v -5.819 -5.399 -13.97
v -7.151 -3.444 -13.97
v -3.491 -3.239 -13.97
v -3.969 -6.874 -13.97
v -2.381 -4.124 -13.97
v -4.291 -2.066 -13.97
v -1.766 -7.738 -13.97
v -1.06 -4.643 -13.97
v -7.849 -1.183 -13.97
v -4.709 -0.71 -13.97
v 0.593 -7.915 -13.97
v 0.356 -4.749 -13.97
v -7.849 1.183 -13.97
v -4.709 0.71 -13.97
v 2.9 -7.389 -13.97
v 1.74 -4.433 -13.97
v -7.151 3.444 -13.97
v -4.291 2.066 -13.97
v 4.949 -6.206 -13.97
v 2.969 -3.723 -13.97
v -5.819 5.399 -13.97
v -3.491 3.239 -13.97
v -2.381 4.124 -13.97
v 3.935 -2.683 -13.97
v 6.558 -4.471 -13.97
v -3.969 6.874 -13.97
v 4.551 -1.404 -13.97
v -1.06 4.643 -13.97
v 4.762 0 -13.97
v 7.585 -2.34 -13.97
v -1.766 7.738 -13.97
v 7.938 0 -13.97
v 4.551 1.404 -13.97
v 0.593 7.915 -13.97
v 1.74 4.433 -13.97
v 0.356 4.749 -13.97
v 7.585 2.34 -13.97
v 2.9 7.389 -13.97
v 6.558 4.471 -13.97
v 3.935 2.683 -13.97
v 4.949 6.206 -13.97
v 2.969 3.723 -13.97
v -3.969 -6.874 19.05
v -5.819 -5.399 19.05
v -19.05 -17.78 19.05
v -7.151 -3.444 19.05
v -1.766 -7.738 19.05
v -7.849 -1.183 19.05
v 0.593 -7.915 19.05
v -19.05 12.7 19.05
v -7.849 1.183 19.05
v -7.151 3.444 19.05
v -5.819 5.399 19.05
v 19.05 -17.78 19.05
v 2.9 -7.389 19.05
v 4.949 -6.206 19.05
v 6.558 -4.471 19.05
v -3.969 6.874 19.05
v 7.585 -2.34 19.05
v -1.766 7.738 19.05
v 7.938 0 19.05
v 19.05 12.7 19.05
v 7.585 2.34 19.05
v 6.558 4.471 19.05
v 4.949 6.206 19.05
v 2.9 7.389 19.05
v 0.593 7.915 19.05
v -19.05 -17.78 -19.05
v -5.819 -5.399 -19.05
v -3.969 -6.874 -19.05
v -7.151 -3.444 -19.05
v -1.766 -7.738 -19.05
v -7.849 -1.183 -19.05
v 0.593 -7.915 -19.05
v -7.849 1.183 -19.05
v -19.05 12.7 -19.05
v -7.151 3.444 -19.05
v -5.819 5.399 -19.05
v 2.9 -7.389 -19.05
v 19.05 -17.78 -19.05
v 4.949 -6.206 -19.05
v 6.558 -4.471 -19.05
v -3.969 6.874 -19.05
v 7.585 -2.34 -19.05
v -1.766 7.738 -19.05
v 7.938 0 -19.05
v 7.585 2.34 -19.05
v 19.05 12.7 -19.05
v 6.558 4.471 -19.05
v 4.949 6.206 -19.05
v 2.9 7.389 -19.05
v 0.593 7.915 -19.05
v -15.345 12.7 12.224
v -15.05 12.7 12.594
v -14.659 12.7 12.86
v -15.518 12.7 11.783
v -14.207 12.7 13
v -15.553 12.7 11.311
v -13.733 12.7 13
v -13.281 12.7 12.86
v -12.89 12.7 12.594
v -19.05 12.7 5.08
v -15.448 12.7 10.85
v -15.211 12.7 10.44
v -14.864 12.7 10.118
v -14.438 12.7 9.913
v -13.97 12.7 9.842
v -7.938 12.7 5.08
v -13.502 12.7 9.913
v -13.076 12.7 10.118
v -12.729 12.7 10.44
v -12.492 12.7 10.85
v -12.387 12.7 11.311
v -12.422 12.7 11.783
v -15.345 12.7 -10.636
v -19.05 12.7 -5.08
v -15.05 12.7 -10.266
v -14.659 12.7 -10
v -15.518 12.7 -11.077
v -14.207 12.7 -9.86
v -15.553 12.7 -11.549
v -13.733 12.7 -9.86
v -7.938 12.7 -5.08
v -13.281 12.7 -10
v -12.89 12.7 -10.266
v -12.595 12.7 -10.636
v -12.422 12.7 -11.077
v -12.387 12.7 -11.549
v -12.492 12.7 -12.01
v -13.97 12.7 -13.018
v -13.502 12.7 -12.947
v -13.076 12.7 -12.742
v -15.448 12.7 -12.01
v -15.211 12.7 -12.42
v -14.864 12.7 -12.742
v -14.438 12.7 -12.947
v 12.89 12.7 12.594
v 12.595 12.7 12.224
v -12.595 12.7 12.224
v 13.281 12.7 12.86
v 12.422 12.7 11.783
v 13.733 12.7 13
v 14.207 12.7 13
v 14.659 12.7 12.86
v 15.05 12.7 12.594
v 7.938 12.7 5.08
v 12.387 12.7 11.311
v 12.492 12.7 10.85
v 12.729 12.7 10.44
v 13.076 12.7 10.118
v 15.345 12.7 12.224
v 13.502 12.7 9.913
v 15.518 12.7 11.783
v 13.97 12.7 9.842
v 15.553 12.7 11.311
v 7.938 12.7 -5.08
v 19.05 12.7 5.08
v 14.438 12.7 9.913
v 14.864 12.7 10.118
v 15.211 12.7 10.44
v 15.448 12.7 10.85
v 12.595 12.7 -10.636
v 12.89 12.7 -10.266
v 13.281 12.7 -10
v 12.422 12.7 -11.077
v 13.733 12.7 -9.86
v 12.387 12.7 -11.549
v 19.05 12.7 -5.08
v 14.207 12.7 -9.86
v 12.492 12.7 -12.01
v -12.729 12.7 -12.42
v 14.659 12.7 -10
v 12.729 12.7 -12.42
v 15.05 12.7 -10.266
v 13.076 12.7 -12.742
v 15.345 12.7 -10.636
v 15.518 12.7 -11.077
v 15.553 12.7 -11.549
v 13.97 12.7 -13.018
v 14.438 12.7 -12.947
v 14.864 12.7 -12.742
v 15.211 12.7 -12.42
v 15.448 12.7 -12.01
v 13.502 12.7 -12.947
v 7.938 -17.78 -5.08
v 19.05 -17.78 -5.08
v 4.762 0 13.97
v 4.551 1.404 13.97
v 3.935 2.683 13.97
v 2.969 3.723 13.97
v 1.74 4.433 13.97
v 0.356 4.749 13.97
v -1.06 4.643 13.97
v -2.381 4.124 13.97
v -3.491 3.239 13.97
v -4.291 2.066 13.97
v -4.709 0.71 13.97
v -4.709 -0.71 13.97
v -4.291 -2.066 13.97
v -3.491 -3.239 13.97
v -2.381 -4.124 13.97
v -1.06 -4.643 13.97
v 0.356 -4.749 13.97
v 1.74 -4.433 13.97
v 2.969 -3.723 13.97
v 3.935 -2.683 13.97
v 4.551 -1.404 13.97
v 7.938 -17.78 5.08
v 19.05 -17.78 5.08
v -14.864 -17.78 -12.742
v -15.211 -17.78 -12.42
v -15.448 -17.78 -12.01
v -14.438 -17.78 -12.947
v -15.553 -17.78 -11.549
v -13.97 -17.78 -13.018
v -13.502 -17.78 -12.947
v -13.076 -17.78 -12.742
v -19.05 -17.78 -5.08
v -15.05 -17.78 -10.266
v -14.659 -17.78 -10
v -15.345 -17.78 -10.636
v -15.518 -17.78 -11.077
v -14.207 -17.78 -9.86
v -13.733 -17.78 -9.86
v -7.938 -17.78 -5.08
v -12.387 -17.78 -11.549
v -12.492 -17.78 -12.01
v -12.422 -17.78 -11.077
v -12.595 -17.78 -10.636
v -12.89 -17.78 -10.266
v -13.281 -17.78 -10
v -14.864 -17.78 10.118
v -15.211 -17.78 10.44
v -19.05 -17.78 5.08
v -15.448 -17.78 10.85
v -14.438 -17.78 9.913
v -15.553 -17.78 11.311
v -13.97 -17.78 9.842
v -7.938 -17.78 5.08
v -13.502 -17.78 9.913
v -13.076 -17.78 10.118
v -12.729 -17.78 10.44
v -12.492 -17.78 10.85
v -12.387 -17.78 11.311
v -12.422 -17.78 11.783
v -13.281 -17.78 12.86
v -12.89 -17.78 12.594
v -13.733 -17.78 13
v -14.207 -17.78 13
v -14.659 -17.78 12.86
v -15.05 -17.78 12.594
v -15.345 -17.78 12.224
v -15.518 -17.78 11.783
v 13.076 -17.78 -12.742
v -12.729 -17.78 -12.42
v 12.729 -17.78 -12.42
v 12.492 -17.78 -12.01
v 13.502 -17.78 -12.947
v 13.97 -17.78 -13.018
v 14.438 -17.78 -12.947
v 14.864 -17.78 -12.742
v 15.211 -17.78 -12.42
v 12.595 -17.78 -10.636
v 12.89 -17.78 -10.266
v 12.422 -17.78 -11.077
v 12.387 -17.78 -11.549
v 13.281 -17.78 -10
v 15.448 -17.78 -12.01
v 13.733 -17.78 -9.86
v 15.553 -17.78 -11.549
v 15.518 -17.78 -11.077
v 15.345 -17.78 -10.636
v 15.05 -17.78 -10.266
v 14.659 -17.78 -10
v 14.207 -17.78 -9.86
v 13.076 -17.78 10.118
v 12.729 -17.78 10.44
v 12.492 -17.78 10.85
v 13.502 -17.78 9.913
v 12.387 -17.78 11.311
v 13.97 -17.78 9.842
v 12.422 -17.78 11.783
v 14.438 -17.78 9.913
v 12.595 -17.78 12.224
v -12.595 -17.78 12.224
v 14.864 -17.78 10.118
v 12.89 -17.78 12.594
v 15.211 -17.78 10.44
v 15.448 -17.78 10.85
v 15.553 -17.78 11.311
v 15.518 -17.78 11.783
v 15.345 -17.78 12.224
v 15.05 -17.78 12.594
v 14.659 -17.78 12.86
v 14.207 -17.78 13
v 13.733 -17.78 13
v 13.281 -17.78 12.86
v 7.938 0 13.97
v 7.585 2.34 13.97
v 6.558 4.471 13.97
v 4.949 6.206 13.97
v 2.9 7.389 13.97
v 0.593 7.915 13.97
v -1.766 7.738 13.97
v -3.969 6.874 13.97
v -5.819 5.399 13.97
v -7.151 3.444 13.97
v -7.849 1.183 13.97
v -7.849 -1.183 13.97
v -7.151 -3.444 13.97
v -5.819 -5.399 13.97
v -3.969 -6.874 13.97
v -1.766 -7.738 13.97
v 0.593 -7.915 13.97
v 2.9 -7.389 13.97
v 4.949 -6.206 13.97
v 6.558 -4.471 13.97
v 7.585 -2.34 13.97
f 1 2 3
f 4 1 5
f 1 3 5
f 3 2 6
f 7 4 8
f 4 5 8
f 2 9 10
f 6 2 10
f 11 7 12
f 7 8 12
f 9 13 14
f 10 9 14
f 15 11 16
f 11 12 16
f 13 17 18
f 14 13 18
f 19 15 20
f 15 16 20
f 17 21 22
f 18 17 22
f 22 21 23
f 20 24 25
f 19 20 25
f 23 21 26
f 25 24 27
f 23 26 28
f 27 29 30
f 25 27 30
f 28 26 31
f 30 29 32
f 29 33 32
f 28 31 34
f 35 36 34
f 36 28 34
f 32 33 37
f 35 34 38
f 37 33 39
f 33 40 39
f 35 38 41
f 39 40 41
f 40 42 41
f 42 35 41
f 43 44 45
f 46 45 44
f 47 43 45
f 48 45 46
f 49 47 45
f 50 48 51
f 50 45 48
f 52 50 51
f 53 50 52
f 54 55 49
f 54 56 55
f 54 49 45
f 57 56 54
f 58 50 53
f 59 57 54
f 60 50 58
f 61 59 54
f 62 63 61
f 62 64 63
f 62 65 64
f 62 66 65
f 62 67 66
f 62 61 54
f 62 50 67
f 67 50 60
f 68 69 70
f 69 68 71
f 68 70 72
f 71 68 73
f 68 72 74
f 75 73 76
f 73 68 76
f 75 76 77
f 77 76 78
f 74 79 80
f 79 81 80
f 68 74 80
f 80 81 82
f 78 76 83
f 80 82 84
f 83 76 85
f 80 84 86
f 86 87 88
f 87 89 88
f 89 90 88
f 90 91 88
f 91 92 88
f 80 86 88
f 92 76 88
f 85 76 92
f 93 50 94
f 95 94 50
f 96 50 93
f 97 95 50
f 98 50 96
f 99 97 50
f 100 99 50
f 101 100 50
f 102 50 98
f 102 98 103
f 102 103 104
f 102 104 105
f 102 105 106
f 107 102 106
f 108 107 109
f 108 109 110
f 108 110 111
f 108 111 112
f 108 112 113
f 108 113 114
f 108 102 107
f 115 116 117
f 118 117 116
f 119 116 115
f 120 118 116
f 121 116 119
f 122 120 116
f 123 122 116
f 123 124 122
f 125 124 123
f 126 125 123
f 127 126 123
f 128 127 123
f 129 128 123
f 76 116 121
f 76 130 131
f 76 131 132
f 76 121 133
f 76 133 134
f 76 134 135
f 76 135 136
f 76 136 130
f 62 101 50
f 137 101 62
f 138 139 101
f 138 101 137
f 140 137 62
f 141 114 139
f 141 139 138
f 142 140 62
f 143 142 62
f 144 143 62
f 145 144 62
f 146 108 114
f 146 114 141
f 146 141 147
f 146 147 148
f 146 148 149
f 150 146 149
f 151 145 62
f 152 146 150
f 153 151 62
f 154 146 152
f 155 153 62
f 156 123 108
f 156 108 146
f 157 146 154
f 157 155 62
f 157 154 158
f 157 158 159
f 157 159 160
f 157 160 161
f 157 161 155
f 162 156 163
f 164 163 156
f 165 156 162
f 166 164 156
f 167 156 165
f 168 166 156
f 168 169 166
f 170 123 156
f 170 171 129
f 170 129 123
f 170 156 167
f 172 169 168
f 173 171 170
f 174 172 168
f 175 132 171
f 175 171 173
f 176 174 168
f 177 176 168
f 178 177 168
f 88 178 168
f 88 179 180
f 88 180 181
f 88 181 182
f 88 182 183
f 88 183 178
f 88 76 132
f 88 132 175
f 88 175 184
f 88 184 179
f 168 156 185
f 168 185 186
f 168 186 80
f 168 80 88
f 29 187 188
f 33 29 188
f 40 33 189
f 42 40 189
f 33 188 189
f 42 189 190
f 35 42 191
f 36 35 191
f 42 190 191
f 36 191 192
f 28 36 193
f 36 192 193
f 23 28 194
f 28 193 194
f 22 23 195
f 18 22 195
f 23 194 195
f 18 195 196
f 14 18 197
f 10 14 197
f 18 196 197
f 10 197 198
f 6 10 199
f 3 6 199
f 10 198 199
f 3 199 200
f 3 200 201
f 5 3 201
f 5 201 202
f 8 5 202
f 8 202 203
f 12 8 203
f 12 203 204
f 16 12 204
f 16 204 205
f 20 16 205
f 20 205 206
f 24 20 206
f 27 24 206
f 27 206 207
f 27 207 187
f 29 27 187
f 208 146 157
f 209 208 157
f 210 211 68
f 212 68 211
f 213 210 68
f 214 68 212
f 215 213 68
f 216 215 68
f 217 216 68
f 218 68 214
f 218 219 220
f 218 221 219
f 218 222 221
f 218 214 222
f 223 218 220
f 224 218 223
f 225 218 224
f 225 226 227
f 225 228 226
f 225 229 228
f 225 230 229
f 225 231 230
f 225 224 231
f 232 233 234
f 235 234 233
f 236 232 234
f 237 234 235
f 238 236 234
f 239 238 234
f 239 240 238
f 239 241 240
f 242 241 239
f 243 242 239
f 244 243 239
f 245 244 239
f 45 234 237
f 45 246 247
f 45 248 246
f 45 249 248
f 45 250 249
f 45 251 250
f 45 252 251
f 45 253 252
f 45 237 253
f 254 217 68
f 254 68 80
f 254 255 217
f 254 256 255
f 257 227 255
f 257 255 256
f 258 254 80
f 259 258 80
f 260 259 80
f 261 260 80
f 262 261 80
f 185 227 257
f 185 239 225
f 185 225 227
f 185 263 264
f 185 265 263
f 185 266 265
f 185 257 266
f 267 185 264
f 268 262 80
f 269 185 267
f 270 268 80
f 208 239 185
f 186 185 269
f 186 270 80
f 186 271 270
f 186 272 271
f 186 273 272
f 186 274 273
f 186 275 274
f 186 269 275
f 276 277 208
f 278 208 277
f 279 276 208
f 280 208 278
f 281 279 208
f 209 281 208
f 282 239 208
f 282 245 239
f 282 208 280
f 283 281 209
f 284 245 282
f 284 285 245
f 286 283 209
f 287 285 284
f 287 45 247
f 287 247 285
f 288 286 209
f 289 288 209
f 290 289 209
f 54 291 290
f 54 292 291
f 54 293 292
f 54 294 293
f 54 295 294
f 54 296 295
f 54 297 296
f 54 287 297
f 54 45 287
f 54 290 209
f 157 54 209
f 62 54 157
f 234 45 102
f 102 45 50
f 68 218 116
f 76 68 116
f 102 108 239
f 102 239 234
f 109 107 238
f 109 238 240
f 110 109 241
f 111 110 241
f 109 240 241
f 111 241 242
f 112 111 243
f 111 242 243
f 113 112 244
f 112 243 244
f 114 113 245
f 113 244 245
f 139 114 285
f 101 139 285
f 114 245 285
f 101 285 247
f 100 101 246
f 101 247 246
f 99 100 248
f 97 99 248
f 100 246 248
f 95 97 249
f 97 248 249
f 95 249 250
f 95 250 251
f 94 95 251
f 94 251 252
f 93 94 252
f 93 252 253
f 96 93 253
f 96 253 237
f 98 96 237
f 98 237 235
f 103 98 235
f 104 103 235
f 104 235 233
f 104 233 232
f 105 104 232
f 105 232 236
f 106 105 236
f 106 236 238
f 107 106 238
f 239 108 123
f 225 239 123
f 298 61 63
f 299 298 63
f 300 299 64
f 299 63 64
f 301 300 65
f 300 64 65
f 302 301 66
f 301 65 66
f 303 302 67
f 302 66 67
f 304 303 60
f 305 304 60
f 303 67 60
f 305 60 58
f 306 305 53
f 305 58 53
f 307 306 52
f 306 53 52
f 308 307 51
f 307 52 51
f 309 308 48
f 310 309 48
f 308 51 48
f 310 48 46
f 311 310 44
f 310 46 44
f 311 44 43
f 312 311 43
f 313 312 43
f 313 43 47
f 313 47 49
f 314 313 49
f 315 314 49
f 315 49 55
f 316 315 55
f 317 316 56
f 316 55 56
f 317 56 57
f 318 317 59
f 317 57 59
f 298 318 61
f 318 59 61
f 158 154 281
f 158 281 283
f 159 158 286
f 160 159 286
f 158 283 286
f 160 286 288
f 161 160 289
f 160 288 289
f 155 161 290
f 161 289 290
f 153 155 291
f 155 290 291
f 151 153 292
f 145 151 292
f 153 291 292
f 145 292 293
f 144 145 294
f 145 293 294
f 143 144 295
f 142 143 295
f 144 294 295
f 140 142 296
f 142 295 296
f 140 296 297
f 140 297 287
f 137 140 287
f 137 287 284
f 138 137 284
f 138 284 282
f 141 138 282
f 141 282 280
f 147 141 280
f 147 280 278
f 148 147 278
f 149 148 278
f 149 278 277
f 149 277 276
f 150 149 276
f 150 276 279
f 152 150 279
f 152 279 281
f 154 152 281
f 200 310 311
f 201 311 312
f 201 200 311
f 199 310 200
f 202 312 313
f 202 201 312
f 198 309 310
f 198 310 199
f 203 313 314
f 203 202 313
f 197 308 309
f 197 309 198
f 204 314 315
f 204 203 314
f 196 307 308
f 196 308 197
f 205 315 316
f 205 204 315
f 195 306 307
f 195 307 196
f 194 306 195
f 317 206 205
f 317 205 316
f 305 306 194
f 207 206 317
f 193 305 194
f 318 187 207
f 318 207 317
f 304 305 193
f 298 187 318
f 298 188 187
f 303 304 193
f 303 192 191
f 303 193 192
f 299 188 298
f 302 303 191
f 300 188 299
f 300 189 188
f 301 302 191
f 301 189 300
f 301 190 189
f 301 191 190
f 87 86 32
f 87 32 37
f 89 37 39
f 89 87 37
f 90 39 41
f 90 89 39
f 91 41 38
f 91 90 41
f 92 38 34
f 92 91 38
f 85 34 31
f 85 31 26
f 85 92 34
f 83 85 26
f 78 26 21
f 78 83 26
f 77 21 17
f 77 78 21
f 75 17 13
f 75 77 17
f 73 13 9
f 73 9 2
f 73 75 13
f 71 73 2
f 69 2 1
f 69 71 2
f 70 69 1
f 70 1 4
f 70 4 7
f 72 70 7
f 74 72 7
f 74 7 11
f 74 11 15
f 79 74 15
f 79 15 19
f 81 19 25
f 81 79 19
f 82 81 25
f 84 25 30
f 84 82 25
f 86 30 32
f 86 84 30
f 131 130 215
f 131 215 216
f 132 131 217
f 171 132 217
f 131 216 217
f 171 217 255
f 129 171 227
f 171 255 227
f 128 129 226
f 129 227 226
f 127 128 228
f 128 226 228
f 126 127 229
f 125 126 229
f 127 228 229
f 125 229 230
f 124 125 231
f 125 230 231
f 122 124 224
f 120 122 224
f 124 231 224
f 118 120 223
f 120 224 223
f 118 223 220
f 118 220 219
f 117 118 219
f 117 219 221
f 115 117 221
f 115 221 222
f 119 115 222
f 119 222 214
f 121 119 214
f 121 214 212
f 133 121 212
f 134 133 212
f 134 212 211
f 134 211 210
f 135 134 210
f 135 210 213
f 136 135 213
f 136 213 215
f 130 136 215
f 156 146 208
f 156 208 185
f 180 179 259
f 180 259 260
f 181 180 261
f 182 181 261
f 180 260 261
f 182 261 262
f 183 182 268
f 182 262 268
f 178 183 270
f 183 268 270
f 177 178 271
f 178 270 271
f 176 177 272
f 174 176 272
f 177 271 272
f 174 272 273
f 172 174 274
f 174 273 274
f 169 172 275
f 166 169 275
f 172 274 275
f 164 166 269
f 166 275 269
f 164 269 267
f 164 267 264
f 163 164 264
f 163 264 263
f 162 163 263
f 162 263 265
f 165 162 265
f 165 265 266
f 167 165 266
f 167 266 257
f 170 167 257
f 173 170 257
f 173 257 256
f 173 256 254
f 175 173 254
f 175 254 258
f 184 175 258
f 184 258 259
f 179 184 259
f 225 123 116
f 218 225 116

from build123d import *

# Parameters (mm, degrees)
SKETCH1_W           = 38.1
SKETCH1_H           = 35.56
BOSS_EXTRUDE2_DEPTH = 19.05
SKETCH2_R           = 7.9375
CUT_EXTRUDE1_DEPTH  = 5.08
SKETCH3_R           = 4.7625
CUT_EXTRUDE2_DEPTH  = 43.063657711
SKETCH4_R           = 1.5875
CUT_EXTRUDE3_DEPTH  = 45.612986898
SKETCH5_W           = 11.1125
SKETCH5_H           = 10.16
CUT_EXTRUDE4_DEPTH  = 45.612986898
CUT_EXTRUDE5_DEPTH  = 5.08


with BuildPart() as part:
    # Sketch1 → Boss-Extrude2 (new, symmetric)
    with BuildSketch(Plane.XY):
        Rectangle(SKETCH1_W, SKETCH1_H)
    extrude(amount=BOSS_EXTRUDE2_DEPTH, both=True)

    # Sketch2 → Cut-Extrude1 (cut)
    with BuildSketch(Plane.XY.offset(19.05)):
        Circle(SKETCH2_R)
    cut_extrude1 = extrude(amount=-CUT_EXTRUDE1_DEPTH, mode=Mode.SUBTRACT)

    # Sketch3 → Cut-Extrude2 (cut, through all)
    with BuildSketch(Plane.XY.offset(13.97)):
        Circle(SKETCH3_R)
    extrude(amount=-CUT_EXTRUDE2_DEPTH, mode=Mode.SUBTRACT)

    # Mirror1: Cut-Extrude1 across plane
    add(cut_extrude1.mirror(Plane.XY), mode=Mode.SUBTRACT)

    # Sketch4 → Cut-Extrude3 (cut, through all)
    with BuildSketch(Plane.XZ.offset(17.78)):
        with Locations(Location((13.97, 11.43, 0), (0, 0, 270))):
            Circle(SKETCH4_R)
        with Locations(Location((13.97, -11.43, 0), (0, 0, 270))):
            Circle(SKETCH4_R)
        with Locations(Location((-13.97, -11.43, 0), (0, 0, 270))):
            Circle(SKETCH4_R)
        with Locations(Location((-13.97, 11.43, 0), (0, 0, 270))):
            Circle(SKETCH4_R)
    extrude(amount=-CUT_EXTRUDE3_DEPTH, mode=Mode.SUBTRACT)

    # Sketch5 → Cut-Extrude4 (cut, through all)
    with BuildSketch(Plane(origin=(0, 17.78, 0), x_dir=(1, 0, 0), z_dir=(0, 1, 0))):
        with Locations((13.49375, 0)):
            Rectangle(SKETCH5_W, SKETCH5_H)
    cut_extrude4 = extrude(amount=-CUT_EXTRUDE4_DEPTH, mode=Mode.SUBTRACT)

    # Mirror2: Cut-Extrude4 across plane
    add(cut_extrude4.mirror(Plane(origin=(0, 0, 0), x_dir=(0, 0, 1), z_dir=(1, 0, 0))), mode=Mode.SUBTRACT)

    # Sketch6 → Cut-Extrude5 (cut)
    with BuildSketch(Plane(origin=(0, 17.78, 0), x_dir=(1, 0, 0), z_dir=(0, 1, 0))):
        Polygon((-19.05, 5.08), (-7.9375, 5.08), (-7.9375, -5.08), (-19.05, -5.08), (-19.05, -19.05), (19.05, -19.05), (19.05, -5.08), (7.9375, -5.08), (7.9375, 5.08), (19.05, 5.08), (19.05, 19.05), (-19.05, 19.05), align=None)
    extrude(amount=-CUT_EXTRUDE5_DEPTH, mode=Mode.SUBTRACT)


solid = part.part
